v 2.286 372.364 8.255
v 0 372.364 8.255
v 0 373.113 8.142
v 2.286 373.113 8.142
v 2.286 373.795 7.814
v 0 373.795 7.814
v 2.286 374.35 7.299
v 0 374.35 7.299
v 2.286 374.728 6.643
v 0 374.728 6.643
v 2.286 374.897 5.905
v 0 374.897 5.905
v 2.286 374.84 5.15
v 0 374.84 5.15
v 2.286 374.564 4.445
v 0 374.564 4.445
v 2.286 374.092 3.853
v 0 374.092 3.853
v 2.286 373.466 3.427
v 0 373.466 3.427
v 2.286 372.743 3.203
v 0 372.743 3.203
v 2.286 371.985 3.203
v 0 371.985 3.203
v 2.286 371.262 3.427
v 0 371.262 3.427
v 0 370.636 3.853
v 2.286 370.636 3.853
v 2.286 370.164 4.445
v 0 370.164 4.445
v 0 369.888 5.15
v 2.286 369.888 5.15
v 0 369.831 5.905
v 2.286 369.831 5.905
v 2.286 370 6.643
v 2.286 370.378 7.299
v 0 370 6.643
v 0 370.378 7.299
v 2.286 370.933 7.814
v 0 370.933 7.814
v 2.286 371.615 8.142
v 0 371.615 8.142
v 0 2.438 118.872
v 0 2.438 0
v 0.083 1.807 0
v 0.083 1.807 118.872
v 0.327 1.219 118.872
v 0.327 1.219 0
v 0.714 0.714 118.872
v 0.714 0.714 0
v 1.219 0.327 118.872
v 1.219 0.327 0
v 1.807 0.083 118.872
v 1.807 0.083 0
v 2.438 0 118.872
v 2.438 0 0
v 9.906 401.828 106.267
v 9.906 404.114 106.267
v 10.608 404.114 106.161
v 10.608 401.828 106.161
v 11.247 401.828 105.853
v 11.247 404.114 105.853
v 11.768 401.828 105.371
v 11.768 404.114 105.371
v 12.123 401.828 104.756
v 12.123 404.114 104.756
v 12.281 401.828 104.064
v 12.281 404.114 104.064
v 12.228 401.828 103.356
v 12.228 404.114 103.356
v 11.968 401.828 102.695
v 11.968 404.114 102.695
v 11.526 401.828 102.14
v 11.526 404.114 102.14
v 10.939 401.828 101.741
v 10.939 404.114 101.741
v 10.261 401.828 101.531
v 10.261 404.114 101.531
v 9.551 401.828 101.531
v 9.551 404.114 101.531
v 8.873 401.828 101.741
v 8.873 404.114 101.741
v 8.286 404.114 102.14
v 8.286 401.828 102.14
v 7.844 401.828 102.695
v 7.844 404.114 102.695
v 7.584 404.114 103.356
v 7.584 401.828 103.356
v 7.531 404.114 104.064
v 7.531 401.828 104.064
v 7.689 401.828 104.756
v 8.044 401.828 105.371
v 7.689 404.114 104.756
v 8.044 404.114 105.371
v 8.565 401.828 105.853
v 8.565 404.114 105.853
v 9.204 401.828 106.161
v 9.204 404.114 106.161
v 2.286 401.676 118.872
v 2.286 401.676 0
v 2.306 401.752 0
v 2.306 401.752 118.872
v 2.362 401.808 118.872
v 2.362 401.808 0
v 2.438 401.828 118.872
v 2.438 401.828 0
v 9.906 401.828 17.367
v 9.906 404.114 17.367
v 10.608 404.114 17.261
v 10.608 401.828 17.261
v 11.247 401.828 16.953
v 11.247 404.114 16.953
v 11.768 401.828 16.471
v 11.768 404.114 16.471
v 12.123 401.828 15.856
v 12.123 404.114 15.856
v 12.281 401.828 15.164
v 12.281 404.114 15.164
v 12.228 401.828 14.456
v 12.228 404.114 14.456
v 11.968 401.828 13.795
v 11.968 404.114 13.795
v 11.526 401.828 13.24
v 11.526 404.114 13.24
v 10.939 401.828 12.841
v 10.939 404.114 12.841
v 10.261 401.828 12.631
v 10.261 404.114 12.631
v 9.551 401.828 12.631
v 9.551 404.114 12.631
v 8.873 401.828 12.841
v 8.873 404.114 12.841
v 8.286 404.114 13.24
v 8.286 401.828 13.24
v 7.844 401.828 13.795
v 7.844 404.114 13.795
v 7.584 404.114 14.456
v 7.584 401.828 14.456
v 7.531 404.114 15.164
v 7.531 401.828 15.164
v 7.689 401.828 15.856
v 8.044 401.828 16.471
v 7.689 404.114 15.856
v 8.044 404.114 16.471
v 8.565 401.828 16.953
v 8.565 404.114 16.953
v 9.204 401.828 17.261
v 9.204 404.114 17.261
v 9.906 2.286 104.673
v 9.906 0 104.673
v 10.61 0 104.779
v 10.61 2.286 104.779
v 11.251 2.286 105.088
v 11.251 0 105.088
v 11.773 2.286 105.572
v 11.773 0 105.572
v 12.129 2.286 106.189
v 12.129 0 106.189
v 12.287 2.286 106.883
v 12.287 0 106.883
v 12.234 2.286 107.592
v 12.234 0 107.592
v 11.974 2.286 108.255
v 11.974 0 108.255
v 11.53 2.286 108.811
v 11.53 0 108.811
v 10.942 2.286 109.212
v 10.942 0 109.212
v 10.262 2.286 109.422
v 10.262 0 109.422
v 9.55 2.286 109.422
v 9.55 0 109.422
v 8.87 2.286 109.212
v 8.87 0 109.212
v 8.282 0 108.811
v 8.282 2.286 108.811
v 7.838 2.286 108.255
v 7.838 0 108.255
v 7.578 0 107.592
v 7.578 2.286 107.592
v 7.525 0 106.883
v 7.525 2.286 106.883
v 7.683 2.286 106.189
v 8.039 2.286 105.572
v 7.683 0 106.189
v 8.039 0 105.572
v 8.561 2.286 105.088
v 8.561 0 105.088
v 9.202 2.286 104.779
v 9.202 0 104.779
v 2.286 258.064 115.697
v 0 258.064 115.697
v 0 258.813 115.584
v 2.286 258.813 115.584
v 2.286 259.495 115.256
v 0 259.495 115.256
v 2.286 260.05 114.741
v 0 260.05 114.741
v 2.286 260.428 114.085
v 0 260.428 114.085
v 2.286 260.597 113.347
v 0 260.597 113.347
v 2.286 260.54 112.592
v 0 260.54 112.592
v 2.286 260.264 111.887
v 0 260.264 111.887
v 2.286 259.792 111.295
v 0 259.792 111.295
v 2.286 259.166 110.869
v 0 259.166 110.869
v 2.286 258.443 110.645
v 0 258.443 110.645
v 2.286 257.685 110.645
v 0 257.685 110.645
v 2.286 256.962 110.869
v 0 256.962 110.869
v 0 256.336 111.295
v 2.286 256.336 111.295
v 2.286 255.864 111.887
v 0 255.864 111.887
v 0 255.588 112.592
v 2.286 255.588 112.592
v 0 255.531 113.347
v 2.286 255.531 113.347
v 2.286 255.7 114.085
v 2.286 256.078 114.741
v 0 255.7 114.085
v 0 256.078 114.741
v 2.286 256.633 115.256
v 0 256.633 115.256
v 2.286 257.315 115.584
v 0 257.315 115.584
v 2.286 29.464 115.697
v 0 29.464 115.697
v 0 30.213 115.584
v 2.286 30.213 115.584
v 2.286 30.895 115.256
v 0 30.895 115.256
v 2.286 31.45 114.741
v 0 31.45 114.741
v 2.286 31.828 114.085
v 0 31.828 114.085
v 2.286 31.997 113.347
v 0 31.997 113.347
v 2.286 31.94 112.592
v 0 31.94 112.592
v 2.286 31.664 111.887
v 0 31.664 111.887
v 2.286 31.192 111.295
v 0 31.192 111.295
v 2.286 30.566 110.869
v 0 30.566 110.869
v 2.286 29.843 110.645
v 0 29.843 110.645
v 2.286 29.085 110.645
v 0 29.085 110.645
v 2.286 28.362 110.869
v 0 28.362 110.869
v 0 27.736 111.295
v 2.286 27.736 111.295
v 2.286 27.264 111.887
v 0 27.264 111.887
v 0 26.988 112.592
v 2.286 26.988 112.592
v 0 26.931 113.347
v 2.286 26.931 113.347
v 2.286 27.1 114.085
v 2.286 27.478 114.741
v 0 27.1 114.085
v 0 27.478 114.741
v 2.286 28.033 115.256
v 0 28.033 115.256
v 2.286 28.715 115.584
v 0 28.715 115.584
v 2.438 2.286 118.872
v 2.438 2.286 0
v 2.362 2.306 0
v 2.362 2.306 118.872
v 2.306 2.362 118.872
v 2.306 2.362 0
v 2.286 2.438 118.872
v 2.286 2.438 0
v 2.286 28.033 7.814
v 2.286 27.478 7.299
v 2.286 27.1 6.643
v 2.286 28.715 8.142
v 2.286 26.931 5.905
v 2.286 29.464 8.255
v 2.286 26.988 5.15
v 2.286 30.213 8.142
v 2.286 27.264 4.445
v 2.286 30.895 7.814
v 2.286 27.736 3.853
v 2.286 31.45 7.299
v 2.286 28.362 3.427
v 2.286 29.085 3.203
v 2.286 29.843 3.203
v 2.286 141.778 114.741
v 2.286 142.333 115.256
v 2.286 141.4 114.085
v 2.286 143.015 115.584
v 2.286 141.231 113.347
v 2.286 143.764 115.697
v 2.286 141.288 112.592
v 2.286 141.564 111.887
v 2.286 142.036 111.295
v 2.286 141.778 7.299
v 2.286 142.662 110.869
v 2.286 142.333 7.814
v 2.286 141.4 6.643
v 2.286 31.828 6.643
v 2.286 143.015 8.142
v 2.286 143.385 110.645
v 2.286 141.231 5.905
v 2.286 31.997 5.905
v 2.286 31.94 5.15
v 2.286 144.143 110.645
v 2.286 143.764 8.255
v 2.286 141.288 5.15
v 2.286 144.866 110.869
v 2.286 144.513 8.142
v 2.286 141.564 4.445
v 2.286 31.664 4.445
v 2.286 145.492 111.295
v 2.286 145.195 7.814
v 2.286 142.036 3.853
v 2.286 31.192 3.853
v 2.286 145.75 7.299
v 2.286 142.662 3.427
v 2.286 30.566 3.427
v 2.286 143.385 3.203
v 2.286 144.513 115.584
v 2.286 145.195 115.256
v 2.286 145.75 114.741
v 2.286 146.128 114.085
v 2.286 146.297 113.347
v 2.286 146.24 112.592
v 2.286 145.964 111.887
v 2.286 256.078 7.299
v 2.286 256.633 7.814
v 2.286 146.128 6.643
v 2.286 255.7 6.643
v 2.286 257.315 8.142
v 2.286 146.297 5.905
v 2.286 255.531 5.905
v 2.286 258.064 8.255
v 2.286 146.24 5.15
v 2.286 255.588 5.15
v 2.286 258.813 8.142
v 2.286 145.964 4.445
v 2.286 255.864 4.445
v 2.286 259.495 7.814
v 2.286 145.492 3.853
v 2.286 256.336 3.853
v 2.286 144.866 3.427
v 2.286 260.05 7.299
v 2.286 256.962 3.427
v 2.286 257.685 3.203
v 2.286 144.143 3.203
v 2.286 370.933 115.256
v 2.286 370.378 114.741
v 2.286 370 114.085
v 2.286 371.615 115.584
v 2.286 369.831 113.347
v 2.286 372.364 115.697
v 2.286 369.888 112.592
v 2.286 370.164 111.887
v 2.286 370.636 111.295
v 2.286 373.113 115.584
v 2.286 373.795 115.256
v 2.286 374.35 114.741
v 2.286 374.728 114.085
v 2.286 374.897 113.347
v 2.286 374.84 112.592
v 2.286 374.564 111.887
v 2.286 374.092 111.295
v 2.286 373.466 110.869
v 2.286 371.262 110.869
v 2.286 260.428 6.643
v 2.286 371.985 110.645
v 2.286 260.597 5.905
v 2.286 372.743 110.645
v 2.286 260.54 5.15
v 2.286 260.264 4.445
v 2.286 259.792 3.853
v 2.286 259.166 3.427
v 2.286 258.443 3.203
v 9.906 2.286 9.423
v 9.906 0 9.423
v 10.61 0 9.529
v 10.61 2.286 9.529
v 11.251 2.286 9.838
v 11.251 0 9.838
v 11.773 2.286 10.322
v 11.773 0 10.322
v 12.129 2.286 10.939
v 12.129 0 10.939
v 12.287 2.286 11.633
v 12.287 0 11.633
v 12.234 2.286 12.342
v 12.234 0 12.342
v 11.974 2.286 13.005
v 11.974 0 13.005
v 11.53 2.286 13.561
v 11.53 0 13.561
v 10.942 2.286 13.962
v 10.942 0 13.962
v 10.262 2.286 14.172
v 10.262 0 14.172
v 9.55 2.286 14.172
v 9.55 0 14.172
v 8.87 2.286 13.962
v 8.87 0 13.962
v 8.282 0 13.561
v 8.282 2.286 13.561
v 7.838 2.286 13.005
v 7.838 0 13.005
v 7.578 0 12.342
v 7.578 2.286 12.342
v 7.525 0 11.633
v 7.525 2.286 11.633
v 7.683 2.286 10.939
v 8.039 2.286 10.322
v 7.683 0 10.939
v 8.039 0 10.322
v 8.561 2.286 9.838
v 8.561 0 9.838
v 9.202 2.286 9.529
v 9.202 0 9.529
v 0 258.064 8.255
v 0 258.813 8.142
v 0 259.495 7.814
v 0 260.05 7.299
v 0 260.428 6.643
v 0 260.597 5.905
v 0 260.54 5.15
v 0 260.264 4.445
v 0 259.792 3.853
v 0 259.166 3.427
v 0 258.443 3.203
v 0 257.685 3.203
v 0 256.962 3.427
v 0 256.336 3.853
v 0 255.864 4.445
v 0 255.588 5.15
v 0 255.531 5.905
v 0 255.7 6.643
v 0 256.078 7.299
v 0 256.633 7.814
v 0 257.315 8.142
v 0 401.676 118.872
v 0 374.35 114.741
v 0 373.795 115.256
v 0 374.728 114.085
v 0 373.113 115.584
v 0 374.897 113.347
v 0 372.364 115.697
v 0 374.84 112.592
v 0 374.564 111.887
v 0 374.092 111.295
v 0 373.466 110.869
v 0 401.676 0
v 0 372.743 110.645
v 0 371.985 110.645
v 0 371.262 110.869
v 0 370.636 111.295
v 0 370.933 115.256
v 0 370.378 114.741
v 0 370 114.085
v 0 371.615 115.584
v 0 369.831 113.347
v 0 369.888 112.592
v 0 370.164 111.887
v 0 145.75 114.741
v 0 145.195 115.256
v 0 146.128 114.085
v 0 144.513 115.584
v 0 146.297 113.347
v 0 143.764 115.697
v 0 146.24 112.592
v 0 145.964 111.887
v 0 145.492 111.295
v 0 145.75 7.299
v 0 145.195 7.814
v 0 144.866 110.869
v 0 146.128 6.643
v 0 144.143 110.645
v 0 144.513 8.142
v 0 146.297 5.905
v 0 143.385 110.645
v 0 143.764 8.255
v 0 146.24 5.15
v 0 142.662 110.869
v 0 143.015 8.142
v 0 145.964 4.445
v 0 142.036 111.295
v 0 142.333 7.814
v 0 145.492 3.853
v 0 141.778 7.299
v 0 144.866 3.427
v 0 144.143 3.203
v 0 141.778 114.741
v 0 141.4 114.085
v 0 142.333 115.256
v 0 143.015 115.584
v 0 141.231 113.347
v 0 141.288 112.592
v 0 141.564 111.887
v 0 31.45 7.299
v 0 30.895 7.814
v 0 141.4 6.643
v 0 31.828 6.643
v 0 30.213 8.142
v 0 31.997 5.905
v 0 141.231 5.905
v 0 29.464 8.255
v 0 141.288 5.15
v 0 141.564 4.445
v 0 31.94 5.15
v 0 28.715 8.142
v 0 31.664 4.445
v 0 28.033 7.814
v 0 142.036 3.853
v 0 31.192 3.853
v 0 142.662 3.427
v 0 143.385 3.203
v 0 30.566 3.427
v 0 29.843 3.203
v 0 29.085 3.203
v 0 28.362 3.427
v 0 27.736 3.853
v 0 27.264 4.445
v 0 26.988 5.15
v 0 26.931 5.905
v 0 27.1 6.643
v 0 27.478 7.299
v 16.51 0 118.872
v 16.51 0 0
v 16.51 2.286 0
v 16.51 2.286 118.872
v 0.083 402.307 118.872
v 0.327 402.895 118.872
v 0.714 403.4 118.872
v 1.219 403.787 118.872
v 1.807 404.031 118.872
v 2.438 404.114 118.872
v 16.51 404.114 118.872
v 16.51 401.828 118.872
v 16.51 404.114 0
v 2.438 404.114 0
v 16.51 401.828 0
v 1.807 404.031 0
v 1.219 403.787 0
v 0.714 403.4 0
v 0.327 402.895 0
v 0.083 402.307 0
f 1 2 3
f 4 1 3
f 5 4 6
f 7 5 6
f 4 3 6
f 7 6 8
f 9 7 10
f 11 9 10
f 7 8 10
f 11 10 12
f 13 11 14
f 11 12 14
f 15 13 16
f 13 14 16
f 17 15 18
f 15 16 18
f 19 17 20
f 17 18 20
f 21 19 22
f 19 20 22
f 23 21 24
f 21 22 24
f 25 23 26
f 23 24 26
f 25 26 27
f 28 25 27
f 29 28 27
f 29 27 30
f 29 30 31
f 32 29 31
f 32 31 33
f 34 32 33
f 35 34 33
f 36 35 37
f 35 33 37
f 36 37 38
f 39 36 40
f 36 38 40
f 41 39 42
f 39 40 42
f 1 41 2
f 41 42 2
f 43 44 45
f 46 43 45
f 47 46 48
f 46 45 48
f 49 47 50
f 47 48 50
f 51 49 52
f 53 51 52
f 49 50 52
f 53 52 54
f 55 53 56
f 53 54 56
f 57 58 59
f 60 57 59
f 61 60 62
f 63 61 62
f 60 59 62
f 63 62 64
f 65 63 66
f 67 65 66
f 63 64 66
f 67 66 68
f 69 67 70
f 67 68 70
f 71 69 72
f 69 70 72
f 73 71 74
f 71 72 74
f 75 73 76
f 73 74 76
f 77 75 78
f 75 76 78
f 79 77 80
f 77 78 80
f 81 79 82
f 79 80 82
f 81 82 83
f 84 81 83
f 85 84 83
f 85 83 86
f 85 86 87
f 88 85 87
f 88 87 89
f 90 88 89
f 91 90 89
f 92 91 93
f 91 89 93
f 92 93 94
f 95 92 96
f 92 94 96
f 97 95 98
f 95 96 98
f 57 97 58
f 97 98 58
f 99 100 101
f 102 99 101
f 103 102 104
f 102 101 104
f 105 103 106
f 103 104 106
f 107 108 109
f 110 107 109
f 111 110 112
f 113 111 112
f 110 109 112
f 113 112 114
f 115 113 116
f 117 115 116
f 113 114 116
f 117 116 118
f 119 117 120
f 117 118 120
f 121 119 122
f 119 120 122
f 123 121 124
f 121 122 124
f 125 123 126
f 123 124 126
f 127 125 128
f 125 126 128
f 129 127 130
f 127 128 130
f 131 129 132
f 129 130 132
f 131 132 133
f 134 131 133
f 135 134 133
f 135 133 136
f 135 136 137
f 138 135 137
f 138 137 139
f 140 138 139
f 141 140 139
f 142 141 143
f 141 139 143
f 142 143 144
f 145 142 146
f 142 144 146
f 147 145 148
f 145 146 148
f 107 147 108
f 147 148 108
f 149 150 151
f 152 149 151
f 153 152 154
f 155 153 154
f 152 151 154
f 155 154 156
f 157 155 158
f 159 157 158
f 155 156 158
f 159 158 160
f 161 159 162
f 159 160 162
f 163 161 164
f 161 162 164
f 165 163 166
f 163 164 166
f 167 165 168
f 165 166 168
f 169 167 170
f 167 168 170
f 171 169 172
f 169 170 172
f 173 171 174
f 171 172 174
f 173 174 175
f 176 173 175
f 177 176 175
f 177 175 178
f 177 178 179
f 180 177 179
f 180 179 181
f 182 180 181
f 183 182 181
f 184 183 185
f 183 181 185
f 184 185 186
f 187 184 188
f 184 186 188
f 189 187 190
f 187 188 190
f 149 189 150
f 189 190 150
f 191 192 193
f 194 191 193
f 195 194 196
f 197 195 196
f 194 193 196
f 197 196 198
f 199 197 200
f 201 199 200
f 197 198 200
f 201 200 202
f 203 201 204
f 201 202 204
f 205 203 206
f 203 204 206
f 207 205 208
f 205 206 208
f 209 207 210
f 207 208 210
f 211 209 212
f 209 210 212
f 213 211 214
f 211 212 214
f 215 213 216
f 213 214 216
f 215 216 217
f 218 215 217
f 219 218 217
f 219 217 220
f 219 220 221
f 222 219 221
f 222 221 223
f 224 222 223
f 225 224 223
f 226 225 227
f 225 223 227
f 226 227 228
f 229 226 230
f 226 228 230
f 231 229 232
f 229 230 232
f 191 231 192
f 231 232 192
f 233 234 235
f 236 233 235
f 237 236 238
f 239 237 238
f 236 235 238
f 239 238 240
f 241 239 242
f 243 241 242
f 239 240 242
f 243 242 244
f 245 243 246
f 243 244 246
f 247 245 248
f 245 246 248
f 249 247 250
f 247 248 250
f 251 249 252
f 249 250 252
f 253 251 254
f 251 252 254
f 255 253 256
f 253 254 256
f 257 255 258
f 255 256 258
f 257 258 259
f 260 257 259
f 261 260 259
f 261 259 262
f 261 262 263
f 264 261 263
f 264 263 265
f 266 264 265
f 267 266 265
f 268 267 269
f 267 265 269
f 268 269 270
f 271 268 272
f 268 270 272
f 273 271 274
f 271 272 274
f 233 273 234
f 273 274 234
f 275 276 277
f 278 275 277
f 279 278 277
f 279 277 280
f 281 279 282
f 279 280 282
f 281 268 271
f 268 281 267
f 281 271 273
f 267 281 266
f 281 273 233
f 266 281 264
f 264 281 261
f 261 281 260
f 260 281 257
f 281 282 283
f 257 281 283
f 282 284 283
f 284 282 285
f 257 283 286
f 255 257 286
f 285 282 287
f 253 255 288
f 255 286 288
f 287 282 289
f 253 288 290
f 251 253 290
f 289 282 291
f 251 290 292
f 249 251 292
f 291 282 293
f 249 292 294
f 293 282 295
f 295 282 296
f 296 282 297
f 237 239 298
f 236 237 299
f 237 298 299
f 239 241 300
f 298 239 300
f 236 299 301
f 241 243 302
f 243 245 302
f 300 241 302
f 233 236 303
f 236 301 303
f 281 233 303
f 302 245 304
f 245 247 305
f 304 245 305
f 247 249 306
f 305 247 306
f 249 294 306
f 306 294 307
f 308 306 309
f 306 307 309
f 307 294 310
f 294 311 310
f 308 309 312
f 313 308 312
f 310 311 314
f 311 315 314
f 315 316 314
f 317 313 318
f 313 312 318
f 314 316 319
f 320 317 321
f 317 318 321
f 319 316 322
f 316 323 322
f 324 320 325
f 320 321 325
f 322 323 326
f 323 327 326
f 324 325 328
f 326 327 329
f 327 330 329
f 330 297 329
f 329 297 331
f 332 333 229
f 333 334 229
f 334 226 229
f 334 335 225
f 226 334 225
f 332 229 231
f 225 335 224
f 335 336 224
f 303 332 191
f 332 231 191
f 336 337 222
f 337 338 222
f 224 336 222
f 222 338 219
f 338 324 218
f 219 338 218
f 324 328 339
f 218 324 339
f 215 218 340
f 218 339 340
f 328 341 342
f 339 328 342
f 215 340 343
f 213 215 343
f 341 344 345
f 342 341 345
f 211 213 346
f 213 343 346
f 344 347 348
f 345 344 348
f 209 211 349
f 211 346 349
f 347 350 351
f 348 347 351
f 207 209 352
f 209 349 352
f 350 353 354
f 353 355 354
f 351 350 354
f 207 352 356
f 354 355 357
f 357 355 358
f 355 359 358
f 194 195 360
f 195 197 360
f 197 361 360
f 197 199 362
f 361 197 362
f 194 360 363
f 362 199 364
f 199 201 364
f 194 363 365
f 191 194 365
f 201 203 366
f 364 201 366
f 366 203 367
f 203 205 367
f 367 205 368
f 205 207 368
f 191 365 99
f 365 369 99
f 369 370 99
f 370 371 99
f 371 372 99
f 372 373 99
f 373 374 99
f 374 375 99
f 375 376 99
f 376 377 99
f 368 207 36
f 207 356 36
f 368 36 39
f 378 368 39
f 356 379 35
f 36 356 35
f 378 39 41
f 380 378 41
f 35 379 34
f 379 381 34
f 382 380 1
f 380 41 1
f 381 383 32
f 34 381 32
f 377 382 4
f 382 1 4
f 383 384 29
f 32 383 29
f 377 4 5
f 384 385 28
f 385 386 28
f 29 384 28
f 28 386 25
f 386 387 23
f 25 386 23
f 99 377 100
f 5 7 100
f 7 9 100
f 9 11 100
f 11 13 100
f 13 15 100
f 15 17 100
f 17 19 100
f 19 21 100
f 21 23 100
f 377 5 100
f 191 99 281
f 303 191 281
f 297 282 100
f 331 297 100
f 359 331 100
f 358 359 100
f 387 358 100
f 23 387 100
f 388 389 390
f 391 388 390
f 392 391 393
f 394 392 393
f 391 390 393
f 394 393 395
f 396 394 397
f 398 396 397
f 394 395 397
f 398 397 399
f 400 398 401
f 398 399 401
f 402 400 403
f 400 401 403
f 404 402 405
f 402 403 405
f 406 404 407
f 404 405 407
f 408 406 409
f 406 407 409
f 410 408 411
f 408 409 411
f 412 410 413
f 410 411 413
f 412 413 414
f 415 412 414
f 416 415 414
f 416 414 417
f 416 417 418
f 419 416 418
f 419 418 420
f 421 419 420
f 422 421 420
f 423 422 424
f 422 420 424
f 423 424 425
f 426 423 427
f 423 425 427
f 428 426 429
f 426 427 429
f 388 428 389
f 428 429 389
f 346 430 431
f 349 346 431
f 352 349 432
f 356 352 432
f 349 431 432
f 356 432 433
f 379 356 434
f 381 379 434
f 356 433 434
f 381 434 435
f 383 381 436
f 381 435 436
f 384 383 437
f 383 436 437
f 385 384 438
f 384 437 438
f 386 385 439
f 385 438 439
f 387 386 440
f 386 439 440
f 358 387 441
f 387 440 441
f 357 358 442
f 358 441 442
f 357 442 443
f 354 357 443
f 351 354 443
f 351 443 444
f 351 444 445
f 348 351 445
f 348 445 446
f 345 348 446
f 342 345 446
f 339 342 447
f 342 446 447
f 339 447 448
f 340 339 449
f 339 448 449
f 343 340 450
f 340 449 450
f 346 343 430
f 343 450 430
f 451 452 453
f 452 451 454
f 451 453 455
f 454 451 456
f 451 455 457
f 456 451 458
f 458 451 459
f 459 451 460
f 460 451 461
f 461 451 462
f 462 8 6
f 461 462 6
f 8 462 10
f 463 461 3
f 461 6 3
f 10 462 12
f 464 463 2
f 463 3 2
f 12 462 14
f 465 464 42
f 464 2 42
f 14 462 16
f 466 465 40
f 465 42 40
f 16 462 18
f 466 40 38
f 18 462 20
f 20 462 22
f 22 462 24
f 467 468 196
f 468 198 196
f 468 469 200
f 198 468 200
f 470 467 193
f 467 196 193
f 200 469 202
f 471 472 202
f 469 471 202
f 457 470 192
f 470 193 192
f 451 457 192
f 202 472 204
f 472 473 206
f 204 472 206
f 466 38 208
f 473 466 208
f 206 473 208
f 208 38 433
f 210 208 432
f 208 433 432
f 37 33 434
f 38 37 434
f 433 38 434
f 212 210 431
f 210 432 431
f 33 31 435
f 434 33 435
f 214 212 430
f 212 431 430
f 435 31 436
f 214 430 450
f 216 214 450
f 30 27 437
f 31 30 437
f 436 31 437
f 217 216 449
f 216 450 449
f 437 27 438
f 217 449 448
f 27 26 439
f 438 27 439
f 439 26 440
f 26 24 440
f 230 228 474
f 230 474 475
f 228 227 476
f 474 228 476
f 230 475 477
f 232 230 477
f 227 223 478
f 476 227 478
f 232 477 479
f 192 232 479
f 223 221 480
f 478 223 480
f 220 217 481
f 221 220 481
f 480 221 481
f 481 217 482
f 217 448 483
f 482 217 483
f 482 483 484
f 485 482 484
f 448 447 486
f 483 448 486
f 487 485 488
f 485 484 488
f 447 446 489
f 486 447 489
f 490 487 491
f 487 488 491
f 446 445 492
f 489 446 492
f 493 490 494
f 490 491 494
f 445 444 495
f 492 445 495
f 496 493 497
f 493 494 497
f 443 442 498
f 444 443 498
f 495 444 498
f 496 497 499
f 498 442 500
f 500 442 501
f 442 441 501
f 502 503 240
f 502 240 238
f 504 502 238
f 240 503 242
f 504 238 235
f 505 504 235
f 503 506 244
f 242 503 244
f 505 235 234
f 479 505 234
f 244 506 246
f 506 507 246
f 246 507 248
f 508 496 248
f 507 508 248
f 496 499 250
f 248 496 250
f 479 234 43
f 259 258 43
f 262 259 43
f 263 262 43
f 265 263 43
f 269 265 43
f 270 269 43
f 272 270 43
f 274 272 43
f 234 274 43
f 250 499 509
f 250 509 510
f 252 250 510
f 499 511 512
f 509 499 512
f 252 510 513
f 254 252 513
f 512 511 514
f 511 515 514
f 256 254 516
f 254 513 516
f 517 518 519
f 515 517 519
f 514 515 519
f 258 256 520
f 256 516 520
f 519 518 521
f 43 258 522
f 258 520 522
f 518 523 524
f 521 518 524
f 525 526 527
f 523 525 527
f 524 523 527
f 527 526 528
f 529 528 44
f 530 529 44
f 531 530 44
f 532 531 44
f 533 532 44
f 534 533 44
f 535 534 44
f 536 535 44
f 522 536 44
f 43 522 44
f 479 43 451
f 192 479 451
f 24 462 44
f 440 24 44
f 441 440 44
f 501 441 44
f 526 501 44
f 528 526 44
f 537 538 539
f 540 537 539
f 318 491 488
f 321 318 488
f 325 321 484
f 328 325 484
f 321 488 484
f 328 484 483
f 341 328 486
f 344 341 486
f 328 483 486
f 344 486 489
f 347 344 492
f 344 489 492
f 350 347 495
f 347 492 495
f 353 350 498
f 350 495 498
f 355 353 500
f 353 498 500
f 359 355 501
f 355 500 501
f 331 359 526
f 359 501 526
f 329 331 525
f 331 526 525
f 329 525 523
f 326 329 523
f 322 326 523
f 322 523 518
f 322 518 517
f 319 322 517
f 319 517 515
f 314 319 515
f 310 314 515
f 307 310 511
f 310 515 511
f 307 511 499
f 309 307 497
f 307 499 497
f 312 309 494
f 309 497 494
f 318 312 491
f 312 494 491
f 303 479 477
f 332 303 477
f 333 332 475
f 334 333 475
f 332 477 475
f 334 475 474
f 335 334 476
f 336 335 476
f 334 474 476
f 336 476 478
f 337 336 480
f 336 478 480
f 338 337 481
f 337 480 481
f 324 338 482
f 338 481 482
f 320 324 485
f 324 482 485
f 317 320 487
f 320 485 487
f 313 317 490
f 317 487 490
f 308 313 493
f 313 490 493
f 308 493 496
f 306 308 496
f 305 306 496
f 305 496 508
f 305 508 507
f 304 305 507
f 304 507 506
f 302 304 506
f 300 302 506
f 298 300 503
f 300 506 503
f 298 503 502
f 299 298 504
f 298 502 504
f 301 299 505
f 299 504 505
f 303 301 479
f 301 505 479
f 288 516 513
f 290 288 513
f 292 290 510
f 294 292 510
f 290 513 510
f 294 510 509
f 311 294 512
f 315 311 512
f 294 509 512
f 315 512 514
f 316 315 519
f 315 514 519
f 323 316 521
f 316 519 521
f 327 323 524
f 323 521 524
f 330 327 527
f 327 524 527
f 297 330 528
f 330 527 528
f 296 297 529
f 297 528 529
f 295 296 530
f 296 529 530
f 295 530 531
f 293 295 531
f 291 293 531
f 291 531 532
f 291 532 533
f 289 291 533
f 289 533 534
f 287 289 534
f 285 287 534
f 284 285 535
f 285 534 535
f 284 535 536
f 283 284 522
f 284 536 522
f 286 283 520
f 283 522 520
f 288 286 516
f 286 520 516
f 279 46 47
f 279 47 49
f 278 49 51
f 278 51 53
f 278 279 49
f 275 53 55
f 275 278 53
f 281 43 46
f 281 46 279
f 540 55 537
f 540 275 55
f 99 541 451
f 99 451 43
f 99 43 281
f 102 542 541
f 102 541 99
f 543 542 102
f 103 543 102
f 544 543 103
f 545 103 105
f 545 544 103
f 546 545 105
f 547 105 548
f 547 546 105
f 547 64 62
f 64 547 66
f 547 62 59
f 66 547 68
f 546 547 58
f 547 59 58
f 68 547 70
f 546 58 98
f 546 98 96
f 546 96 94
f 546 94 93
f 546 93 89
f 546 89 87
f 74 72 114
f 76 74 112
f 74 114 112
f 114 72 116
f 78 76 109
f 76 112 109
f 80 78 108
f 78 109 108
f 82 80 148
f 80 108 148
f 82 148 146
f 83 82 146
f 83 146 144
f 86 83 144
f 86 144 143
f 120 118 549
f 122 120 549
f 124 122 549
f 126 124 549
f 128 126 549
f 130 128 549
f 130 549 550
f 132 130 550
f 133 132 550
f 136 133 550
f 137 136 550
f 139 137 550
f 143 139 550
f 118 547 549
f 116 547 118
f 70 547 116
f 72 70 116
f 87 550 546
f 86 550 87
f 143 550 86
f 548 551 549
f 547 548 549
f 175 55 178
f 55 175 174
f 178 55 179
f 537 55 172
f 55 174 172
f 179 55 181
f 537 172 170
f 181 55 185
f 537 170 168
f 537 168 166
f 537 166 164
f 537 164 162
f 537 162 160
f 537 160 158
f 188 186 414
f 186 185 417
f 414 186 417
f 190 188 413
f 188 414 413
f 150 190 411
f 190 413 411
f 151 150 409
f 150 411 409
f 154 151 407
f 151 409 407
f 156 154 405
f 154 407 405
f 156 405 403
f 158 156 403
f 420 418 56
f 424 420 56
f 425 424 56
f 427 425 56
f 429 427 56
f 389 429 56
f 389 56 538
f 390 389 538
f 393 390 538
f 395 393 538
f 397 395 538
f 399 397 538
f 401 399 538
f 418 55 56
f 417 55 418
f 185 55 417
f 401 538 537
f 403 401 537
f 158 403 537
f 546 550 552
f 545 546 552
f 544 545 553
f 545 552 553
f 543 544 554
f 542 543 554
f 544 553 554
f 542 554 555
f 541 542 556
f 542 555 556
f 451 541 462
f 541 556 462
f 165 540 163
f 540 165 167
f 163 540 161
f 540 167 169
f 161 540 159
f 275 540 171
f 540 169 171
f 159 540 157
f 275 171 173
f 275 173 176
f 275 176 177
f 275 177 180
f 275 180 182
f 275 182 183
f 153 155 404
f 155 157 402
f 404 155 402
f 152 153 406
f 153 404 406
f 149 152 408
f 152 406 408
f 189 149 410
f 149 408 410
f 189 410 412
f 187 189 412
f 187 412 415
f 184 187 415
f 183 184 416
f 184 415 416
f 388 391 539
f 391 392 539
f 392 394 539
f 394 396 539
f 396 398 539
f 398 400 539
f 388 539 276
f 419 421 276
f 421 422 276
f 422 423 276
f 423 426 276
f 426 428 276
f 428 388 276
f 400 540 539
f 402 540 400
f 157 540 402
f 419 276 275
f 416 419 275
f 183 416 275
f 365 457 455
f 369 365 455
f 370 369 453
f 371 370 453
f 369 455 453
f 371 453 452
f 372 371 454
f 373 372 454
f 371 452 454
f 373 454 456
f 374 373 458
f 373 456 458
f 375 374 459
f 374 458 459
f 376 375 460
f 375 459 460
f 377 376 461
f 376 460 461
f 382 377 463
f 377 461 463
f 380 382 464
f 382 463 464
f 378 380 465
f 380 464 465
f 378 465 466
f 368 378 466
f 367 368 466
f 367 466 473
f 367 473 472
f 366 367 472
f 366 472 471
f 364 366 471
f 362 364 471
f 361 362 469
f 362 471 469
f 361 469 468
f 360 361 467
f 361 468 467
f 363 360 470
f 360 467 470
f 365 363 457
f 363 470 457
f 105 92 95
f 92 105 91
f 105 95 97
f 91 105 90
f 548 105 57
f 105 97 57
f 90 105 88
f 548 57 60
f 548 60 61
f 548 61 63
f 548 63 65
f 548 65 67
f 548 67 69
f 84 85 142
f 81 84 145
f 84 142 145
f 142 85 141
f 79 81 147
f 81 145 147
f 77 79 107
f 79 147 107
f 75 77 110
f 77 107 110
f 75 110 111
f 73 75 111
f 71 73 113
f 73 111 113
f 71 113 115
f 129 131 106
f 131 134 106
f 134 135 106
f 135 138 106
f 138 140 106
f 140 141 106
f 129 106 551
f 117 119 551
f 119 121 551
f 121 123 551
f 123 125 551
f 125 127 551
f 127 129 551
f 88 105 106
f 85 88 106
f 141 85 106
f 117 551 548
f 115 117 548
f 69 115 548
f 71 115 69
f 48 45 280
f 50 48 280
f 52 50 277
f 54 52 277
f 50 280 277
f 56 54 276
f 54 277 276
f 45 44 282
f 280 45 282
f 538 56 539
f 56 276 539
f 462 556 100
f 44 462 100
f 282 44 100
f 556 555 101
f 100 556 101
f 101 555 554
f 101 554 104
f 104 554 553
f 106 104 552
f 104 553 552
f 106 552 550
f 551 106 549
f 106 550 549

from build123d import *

# Parameters (mm, degrees)
BASE_FLANGE2_DEPTH = 118.872
SKETCH3_R          = 2.54
CUT_EXTRUDE1_DEPTH = 2.286
SKETCH4_R          = 2.3876
CUT_EXTRUDE3_DEPTH = 2.286
SKETCH7_R          = 2.38125
CUT_EXTRUDE4_DEPTH = 2.286


# Sheet-metal steps are written as plain solids
with BuildPart() as part:
    # Sketch2 → Base-Flange2 (new body)
    with BuildSketch(Plane.XY):
        with BuildLine():
            Line((16.51, 404.114), (2.4384, 404.114))
            ThreePointArc((2.4384, 404.114), (0.714190825, 403.399809175), (0, 401.6756))
            Line((0, 401.6756), (0, 2.4384))
            ThreePointArc((0, 2.4384), (0.714190825, 0.714190825), (2.4384, 0))
            Line((2.4384, 0), (16.51, 0))
            Line((16.51, 0), (16.51, 2.286))
            Line((16.51, 2.286), (2.4384, 2.286))
            ThreePointArc((2.4384, 2.286), (2.330636927, 2.330636927), (2.286, 2.4384))
            Line((2.286, 2.4384), (2.286, 401.6756))
            ThreePointArc((2.286, 401.6756), (2.330636927, 401.783363073), (2.4384, 401.828))
            Line((2.4384, 401.828), (16.51, 401.828))
            Line((16.51, 401.828), (16.51, 404.114))
        make_face()
    extrude(amount=BASE_FLANGE2_DEPTH)

    # Sketch3 → Cut-Extrude1 (cut)
    with BuildSketch(Plane.ZY):
        with Locations((5.715, 258.064)):
            Circle(SKETCH3_R)
        with Locations((113.157, 258.064)):
            Circle(SKETCH3_R)
        with Locations((5.715, 143.764)):
            Circle(SKETCH3_R)
        with Locations((113.157, 143.764)):
            Circle(SKETCH3_R)
        with Locations((5.715, 372.364)):
            Circle(SKETCH3_R)
        with Locations((113.157, 372.364)):
            Circle(SKETCH3_R)
        with Locations((113.157, 29.464)):
            Circle(SKETCH3_R)
        with Locations((5.715, 29.464)):
            Circle(SKETCH3_R)
    extrude(amount=-CUT_EXTRUDE1_DEPTH, mode=Mode.SUBTRACT)

    # Sketch4 → Cut-Extrude3 (cut)
    with BuildSketch(Plane.XZ):
        with Locations(Location((9.906, 107.061, 0), (0, 0, 270))):
            Circle(SKETCH4_R)
        with Locations(Location((9.906, 11.811, 0), (0, 0, 270))):
            Circle(SKETCH4_R)
    extrude(amount=-CUT_EXTRUDE3_DEPTH, mode=Mode.SUBTRACT)

    # Sketch7 → Cut-Extrude4 (cut)
    with BuildSketch(Plane(origin=(0, 404.114, 0), x_dir=(-1, 0, 0), z_dir=(0, 1, 0))):
        with Locations(Location((-9.906, 103.886, 0), (0, 0, 90))):
            Circle(SKETCH7_R)
        with Locations(Location((-9.906, 14.986, 0), (0, 0, 90))):
            Circle(SKETCH7_R)
    extrude(amount=-CUT_EXTRUDE4_DEPTH, mode=Mode.SUBTRACT)


solid = part.part
